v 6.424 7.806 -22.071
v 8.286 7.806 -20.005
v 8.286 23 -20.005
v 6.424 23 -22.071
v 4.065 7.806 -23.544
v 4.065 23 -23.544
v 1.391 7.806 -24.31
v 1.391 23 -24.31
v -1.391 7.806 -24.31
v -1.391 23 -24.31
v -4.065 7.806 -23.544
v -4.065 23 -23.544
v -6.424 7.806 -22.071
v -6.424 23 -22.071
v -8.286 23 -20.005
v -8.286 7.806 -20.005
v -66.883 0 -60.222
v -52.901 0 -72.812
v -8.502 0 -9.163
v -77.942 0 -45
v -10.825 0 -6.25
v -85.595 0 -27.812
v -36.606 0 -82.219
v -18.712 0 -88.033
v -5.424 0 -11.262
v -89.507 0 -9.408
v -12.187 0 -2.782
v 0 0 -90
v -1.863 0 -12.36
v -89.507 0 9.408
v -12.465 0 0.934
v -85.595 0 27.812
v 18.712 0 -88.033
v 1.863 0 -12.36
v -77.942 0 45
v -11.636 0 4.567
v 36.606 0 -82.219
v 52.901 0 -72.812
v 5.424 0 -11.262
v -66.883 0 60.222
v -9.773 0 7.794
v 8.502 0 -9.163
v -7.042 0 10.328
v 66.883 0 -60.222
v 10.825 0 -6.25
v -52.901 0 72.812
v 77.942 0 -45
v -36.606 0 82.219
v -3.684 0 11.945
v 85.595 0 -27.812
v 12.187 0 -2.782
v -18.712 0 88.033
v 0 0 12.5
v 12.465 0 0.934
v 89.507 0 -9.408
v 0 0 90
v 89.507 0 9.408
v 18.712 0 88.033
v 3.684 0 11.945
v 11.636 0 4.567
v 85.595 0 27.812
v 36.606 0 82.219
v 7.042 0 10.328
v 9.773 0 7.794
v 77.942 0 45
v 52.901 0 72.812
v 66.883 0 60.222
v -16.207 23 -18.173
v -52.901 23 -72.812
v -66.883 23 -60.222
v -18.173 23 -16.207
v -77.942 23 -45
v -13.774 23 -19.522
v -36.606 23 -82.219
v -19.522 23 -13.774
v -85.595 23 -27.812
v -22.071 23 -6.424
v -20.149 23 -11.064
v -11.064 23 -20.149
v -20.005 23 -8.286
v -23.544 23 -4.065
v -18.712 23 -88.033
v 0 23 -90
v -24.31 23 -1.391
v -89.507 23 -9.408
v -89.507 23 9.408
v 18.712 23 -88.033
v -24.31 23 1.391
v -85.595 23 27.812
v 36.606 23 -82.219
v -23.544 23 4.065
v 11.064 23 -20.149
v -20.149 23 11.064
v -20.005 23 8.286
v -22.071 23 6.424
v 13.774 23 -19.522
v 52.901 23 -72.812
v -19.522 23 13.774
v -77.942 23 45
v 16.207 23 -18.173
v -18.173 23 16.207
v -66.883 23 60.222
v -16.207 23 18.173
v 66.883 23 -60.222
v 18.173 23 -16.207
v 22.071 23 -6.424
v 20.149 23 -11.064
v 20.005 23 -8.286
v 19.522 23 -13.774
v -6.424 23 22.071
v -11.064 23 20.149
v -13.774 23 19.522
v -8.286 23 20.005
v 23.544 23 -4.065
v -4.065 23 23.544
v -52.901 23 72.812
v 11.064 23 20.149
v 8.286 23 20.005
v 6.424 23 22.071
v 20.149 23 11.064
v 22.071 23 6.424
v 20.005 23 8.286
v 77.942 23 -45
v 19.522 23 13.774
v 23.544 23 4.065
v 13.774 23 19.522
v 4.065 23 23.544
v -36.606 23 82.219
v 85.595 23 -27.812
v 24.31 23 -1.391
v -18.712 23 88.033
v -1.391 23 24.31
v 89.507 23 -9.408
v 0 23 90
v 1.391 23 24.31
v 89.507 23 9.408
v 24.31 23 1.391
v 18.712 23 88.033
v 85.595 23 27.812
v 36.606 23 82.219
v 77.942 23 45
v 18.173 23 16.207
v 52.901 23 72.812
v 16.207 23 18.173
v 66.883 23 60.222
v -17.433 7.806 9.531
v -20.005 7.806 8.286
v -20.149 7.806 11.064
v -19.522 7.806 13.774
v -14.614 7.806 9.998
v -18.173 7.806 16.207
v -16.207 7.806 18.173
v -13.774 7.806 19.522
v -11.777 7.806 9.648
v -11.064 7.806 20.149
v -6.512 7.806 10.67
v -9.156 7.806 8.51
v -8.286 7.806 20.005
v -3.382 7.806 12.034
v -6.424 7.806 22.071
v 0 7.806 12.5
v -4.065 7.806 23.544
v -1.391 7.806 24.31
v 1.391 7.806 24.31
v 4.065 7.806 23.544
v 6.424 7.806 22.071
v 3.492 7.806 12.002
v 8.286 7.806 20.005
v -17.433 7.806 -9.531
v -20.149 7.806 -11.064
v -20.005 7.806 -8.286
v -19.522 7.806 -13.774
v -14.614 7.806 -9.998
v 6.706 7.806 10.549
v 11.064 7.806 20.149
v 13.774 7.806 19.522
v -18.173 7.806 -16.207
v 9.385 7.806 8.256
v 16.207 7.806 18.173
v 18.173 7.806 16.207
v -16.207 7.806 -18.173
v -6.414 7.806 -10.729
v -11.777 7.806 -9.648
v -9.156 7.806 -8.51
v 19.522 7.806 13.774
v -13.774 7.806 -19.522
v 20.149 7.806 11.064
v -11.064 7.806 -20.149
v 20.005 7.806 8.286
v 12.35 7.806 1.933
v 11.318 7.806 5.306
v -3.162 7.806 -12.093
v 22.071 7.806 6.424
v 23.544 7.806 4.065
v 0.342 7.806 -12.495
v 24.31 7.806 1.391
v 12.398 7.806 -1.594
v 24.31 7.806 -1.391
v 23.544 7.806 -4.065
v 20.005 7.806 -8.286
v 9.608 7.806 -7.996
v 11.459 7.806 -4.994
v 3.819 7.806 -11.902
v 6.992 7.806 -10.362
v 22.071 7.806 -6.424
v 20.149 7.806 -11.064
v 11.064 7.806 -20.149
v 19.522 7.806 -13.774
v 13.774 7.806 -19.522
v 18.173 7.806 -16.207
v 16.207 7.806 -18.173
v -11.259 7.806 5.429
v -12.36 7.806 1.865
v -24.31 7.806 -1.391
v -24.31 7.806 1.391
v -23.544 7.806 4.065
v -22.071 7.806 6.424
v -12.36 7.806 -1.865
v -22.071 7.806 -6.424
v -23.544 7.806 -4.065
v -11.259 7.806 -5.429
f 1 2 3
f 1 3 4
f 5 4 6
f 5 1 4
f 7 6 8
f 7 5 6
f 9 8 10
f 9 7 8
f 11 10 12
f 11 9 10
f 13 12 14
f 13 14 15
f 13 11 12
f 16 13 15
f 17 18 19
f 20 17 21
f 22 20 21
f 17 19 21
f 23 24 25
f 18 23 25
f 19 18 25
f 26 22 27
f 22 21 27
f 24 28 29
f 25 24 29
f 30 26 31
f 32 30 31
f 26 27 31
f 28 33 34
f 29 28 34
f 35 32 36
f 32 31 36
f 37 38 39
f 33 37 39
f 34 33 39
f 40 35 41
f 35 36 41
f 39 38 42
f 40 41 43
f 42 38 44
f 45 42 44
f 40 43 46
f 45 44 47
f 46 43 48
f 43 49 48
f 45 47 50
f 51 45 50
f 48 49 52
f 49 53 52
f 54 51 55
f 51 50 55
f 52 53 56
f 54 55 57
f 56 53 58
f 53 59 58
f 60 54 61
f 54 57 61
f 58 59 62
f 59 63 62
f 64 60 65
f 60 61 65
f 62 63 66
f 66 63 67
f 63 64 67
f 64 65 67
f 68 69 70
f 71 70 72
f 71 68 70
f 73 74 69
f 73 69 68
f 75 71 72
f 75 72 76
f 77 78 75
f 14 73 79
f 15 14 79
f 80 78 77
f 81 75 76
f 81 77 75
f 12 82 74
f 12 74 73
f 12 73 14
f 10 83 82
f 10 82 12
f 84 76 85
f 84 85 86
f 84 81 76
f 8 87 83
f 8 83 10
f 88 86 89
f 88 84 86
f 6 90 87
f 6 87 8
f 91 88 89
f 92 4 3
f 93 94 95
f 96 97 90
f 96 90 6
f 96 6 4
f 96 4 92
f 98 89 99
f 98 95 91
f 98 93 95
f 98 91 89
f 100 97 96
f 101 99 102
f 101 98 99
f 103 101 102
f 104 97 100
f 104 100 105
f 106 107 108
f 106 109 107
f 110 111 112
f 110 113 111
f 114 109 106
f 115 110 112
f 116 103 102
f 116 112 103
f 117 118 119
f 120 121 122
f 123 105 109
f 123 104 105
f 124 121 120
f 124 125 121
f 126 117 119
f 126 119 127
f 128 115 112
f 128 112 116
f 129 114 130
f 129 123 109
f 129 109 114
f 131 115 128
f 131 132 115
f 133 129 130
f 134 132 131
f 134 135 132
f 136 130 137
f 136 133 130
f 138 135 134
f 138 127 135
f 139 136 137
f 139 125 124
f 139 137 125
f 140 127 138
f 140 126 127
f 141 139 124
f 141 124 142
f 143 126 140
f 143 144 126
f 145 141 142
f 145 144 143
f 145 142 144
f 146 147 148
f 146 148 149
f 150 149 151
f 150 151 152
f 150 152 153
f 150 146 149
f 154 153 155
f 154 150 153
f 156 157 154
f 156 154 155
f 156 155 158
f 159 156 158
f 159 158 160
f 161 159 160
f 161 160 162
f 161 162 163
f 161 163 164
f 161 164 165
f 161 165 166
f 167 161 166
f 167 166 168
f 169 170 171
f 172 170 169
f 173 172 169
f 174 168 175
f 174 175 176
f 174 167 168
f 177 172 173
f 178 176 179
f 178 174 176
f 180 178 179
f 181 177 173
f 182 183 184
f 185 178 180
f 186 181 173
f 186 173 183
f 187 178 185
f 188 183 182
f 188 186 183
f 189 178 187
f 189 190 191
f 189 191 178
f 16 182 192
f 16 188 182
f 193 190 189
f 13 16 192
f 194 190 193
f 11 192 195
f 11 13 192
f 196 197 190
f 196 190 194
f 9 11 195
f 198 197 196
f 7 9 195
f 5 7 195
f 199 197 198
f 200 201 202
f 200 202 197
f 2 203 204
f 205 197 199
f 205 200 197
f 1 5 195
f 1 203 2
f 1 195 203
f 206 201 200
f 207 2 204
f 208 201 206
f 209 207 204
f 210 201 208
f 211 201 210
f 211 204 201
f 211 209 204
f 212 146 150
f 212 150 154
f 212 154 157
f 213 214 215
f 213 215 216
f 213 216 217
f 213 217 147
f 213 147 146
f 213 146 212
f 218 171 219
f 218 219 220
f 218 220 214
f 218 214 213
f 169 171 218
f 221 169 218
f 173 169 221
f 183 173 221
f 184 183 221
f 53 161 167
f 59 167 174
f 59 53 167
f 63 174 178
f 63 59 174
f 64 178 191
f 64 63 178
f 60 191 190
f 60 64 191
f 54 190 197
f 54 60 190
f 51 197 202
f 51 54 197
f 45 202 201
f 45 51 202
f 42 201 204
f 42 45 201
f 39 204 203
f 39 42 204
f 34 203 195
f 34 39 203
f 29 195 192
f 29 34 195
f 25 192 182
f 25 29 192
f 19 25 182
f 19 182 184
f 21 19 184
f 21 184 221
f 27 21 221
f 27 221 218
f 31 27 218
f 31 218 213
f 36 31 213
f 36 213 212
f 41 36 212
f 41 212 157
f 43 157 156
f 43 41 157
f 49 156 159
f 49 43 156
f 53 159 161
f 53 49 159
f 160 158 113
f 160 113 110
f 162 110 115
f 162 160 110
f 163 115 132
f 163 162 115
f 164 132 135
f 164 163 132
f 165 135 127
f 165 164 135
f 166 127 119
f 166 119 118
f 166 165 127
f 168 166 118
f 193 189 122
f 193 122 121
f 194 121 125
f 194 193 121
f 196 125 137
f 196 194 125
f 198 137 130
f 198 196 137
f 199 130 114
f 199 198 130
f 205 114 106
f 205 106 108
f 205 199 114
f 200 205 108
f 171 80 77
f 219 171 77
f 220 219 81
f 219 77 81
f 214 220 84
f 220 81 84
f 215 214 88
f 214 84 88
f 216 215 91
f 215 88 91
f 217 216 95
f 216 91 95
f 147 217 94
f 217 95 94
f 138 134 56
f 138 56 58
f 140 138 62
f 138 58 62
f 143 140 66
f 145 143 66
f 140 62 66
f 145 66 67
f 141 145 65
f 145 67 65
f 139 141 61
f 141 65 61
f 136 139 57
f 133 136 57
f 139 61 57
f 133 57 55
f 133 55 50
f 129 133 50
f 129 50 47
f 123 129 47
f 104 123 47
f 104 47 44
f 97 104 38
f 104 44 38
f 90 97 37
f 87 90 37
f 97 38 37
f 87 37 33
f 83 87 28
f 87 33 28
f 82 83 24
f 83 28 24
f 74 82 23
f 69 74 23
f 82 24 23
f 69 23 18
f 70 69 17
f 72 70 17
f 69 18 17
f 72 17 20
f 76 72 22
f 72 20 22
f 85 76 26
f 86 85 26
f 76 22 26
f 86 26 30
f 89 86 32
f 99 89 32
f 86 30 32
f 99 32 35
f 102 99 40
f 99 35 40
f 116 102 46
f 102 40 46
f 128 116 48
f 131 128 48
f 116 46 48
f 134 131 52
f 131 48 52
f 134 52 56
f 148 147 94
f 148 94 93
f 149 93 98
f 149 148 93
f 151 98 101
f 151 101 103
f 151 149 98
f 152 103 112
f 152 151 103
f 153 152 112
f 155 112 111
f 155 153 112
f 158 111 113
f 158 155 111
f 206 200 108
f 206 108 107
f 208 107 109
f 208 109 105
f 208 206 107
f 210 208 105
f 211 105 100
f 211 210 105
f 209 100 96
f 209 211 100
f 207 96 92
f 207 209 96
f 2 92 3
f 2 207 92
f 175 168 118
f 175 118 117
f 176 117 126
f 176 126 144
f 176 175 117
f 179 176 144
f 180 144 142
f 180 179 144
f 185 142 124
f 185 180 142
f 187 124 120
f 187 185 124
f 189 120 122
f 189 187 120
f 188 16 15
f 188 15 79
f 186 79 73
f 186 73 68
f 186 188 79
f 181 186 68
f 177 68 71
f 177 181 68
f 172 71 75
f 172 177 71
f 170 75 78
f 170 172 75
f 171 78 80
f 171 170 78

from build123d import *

# Parameters (mm, degrees)
SKETCH1_R           = 90
BOSS_EXTRUDE1_DEPTH = 23
SKETCH2_R           = 12.5
CUT_EXTRUDE1_DEPTH  = 130.340635533
SKETCH3_R           = 10
CUT_EXTRUDE2_DEPTH  = 15.193840242
CIRPATTERN1_COUNT   = 8


with BuildPart() as part:
    # Sketch1 → Boss-Extrude1 (new body)
    with BuildSketch(Plane(origin=(0, 0, 0), x_dir=(1, 0, 0), z_dir=(0, 1, 0))):
        Circle(SKETCH1_R)
    extrude(amount=BOSS_EXTRUDE1_DEPTH)

    # Sketch2 → Cut-Extrude1 (cut, through all)
    with BuildSketch(Plane(origin=(0, 0, 0), x_dir=(1, 0, 0), z_dir=(0, 1, 0))):
        Circle(SKETCH2_R)
    extrude(amount=CUT_EXTRUDE1_DEPTH, mode=Mode.SUBTRACT)

    # Sketch3 → Cut-Extrude2 (cut)
    with BuildSketch(Plane(origin=(0, 23, 0), x_dir=(1, 0, 0), z_dir=(0, 1, 0))):
        with Locations((-14.407608976, 0)):
            Circle(SKETCH3_R)
    cut_extrude2 = extrude(amount=-CUT_EXTRUDE2_DEPTH, mode=Mode.SUBTRACT)

    # CirPattern1: Cut-Extrude2 ×8 about axis
    cirpattern1_axis = Axis((0, 0, 0), (0, 1, 0))
    for i in range(1, CIRPATTERN1_COUNT):
        add(cut_extrude2.rotate(cirpattern1_axis, i * 360 / CIRPATTERN1_COUNT), mode=Mode.SUBTRACT)


solid = part.part
